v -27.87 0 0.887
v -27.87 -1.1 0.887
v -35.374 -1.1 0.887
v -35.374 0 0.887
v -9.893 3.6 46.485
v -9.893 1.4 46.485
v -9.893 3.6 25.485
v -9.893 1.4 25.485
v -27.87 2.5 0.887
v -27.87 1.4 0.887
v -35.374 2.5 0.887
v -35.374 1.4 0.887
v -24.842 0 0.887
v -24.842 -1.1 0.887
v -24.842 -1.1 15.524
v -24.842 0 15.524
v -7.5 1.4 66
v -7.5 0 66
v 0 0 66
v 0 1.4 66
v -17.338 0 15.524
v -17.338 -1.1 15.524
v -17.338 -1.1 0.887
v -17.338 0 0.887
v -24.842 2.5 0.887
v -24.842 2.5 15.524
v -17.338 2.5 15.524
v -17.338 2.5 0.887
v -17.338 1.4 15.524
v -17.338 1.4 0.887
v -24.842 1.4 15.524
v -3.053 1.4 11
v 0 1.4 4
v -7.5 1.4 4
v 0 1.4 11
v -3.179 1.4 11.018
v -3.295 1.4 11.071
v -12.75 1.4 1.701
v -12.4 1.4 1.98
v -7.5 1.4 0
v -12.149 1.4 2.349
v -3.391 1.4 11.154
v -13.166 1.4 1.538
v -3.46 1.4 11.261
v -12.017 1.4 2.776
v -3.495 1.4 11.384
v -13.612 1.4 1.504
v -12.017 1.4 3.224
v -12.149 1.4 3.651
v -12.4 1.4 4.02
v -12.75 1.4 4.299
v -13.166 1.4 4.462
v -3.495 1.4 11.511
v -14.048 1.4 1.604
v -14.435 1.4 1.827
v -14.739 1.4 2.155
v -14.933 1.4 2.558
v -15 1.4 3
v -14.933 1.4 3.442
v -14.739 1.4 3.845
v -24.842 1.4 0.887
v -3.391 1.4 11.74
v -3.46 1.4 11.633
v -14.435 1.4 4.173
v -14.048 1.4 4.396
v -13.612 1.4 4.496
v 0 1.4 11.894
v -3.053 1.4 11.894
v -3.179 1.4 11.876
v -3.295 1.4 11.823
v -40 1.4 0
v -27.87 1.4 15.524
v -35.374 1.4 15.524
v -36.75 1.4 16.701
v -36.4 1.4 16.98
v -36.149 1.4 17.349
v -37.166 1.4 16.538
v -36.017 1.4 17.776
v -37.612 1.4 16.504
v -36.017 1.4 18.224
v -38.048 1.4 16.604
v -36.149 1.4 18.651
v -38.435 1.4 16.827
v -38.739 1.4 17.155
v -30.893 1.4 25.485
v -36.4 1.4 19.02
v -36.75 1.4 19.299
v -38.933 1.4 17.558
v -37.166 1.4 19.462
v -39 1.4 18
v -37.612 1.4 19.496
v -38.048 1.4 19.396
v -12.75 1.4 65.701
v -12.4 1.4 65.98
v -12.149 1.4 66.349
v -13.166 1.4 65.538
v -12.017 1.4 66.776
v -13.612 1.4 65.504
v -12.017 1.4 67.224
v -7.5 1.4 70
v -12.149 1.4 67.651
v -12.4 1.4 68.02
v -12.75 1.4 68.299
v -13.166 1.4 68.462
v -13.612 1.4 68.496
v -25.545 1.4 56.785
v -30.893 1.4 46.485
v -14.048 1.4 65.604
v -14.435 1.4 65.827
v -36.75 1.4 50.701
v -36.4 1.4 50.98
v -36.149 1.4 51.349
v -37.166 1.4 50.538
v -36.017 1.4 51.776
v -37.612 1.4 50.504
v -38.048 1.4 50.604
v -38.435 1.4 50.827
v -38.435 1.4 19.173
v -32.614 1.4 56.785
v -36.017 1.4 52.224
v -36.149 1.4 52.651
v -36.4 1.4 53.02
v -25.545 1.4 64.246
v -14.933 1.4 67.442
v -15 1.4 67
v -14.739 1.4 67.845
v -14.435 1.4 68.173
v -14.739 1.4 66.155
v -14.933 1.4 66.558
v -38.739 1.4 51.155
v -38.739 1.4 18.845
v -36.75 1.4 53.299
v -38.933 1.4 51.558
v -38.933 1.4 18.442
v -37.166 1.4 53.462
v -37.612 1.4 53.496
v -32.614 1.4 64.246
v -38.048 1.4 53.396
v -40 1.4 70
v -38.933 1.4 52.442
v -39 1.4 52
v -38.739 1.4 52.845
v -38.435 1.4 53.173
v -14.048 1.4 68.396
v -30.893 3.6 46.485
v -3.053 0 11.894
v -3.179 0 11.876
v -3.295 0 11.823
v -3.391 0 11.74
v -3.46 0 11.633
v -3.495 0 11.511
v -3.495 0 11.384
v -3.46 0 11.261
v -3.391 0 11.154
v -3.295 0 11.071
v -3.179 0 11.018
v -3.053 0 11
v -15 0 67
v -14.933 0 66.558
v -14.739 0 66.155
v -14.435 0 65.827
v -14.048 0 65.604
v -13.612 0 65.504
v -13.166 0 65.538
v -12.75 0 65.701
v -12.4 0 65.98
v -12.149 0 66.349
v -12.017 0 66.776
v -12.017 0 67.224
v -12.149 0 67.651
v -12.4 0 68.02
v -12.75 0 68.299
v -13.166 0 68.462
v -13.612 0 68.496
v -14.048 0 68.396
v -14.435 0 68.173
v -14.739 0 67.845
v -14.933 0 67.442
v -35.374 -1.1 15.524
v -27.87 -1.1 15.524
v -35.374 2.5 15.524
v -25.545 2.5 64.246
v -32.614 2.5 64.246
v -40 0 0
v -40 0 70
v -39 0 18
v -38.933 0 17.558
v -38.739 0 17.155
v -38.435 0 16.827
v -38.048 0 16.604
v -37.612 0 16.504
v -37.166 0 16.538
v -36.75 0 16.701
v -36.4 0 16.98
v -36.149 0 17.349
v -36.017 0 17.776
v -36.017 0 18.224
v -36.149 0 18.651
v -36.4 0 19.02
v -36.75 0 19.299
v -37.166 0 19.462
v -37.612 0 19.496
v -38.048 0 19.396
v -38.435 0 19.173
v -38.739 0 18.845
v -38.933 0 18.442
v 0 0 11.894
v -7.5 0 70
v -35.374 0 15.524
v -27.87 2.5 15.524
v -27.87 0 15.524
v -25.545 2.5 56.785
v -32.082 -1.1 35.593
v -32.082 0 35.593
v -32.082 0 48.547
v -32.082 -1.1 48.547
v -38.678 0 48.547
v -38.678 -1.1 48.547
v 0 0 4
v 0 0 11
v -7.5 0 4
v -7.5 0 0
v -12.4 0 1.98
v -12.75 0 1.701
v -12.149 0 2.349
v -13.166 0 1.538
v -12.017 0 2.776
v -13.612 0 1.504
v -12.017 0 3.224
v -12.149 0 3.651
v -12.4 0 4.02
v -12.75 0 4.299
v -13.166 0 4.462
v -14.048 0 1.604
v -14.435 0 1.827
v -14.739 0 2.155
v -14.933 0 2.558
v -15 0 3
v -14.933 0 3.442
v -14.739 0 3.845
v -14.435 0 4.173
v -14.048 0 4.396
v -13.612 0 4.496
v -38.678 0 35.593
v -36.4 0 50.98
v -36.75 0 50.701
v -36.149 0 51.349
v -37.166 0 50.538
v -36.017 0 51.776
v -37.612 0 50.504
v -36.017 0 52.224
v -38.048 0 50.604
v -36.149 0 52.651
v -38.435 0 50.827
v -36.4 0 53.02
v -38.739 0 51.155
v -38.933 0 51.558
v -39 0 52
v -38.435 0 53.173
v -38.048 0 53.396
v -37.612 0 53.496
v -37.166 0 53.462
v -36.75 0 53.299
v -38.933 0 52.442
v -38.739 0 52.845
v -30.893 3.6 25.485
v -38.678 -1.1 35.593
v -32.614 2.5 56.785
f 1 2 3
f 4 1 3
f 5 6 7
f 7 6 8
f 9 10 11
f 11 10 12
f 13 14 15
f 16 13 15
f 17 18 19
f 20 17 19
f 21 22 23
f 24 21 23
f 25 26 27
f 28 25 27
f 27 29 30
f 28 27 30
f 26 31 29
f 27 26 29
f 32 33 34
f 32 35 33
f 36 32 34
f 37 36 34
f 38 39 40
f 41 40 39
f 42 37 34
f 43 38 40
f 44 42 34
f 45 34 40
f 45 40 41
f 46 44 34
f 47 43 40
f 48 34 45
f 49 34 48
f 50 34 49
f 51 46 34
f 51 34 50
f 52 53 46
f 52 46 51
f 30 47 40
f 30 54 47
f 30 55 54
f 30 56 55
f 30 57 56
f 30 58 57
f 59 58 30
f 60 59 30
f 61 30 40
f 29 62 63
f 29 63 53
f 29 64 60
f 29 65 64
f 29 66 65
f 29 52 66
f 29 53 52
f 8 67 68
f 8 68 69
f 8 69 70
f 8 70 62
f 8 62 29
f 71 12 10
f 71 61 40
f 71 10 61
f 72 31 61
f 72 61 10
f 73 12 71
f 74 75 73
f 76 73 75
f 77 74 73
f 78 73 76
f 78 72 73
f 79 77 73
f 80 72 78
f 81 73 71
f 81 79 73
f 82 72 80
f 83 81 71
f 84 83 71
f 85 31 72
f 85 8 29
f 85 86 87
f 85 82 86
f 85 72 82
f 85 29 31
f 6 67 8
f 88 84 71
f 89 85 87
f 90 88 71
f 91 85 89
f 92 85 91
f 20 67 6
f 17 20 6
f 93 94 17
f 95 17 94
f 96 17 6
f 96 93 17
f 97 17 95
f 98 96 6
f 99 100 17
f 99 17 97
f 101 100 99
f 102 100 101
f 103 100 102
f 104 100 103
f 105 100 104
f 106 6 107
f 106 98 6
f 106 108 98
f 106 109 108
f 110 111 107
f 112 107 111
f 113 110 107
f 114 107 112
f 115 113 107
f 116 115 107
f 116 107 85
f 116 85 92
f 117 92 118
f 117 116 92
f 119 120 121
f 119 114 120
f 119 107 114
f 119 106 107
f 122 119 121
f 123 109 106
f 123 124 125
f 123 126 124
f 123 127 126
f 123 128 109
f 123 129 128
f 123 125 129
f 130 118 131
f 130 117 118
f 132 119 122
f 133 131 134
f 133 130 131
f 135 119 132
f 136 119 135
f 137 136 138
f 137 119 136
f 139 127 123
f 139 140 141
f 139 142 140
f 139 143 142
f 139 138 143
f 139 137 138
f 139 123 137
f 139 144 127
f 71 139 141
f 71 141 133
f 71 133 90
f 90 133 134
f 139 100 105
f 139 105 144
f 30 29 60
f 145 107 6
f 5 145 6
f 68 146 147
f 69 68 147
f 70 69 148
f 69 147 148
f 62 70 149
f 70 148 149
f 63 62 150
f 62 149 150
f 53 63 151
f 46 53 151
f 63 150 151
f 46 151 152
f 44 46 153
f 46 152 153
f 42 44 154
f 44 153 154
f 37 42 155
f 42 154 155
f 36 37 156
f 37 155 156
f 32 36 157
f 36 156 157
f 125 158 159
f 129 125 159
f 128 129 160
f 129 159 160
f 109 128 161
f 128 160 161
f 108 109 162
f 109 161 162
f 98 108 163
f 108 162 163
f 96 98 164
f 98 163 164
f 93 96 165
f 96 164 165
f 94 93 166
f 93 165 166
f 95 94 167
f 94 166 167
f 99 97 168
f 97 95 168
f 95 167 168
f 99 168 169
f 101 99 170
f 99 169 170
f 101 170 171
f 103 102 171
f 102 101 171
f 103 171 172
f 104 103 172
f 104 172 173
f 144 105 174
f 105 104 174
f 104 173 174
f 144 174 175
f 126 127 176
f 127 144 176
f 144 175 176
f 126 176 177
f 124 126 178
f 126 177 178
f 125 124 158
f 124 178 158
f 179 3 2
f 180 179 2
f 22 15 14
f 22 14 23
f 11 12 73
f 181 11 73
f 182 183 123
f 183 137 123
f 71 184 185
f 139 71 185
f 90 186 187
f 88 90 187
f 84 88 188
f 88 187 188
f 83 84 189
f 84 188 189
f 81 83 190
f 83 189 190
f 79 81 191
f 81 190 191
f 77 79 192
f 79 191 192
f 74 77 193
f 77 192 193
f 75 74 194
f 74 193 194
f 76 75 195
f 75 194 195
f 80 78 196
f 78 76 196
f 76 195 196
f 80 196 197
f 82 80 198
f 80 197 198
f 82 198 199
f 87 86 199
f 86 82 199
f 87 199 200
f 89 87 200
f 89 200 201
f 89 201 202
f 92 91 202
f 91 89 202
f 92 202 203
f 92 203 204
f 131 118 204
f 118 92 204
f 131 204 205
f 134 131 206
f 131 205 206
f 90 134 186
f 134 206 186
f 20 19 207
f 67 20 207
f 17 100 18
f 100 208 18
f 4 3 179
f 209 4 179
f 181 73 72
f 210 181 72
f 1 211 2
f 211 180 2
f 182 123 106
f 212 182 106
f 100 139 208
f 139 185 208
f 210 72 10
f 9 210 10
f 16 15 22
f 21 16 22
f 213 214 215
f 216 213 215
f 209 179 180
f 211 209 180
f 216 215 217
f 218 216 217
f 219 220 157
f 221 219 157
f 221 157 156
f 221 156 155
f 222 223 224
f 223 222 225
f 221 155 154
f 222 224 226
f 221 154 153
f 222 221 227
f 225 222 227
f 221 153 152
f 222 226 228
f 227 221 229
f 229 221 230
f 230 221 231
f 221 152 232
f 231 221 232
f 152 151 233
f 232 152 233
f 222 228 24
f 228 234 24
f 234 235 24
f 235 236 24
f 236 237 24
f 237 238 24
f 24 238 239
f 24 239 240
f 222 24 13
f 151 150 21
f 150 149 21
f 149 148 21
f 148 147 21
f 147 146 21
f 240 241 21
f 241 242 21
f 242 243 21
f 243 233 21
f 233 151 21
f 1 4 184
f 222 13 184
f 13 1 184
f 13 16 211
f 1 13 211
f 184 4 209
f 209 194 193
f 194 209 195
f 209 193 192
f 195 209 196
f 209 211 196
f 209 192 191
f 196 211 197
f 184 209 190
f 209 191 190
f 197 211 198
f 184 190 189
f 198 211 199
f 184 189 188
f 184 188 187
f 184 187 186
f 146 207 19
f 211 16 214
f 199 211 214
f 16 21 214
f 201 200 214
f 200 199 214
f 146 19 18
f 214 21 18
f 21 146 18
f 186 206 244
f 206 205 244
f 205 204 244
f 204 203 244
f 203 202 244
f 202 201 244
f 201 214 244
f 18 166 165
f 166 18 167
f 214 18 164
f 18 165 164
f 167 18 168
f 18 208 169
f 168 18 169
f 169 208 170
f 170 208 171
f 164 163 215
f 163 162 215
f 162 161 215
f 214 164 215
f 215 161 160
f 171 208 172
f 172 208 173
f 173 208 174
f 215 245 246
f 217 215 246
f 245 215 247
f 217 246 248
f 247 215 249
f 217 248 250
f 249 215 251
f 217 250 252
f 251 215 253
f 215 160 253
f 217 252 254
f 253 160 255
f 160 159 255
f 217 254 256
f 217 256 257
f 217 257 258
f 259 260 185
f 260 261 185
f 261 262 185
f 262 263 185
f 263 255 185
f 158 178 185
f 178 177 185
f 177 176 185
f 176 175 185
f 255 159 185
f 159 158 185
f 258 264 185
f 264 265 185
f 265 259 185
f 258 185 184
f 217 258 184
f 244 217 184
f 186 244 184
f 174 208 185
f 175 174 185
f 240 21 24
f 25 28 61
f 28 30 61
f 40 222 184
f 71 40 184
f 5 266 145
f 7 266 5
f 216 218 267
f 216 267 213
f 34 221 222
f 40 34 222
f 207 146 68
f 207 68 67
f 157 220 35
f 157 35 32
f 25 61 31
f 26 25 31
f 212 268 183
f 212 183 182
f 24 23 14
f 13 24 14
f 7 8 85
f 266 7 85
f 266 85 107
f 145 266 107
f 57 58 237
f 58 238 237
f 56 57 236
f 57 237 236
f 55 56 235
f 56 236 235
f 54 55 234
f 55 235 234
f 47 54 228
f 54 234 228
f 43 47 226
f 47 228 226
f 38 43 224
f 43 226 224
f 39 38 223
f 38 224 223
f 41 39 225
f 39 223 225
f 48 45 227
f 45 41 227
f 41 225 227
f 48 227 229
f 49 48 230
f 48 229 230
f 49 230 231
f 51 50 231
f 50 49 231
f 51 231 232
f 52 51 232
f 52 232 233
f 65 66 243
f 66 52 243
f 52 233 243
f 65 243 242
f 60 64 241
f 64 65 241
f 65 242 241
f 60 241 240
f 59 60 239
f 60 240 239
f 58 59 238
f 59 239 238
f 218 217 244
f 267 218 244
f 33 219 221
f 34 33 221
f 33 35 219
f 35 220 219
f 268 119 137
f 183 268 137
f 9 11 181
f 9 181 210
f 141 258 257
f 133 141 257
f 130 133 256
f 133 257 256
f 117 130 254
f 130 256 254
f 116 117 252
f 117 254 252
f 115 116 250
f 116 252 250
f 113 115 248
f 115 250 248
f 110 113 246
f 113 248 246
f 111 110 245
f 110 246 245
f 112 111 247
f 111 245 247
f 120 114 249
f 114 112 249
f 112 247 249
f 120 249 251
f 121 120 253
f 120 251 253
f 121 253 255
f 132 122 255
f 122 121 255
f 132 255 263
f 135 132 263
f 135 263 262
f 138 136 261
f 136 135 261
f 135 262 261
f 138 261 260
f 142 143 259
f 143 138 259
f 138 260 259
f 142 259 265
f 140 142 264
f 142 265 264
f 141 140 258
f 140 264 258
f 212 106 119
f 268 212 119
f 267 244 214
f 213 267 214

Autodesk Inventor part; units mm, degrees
ref_plane "YZ Plane" through (0, 0, 0) normal (1, 0, 0) x (0, 1, 0)
ref_plane "XZ Plane" through (0, 0, 0) normal (0, 1, 0) x (-1, 0, 0)
ref_plane "XY Plane" through (0, 0, 0) normal (0, 0, 1) x (1, 0, 0)
sketch "Sketch1" plane through (0, 0, 0) normal (0, 1, 0) x (-1, 0, 0)
  line L0 (40, 70) -> (0, 70)
  line L1 (0, 70) -> (0, 0)
  line L2 (0, 0) -> (40, 0)
  line L3 (40, 0) -> (40, 70)
  line L4 (0, 4) -> (7.5, 4)
  line L5 (7.5, 4) -> (7.5, 0)
  line L6 (7.5, 0) -> (0, 0)
  line L7 (0, 0) -> (0, 4)
  line L8 (0, 70) -> (7.5, 70)
  line L9 (7.5, 70) -> (7.5, 66)
  line L10 (7.5, 66) -> (0, 66)
  line L11 (0, 66) -> (0, 70)
  line L12 (0, 11) -> (3.0528, 11)
  line L13 (3.5, 11.4472) -> (3.5, 11.8944)
  line L14 (3.0528, 11.8944) -> (0, 11.8944)
  line L15 (0, 11.8944) -> (0, 11)
  arc A0 (3.0528, 11) -> (3.0528, 11.8944) centre (3.0528, 11.4472) ccw
  circle A1 centre (13.5, 3) radius 1.5
  circle A2 centre (13.5, 67) radius 1.5
  circle A3 centre (37.5, 52) radius 1.5
  circle A4 centre (37.5, 18) radius 1.5
  dimension "d0" = 70
  dimension "d1" = 40
  dimension "d2" = 0
  dimension "d3" = 0
  dimension "d4" = 7.5
  dimension "d5" = 7.5
  dimension "d6" = 4
  dimension "d7" = 4
  dimension "d8" = 1
  dimension "d9" = 11
  dimension "d10" = 3.5
  dimension "d13" = 3
  dimension "d14" = 3
  dimension "d15" = 3
  dimension "d16" = 3
  dimension "d17" = 13.5
  dimension "d18" = 13.5
  dimension "d19" = 3
  dimension "d20" = 3
  dimension "d21" = 2.5
  dimension "d22" = 2.5
  dimension "d23" = 18
  dimension "d24" = 18
extrude "Extrusion1" add sketch "Sketch1" along normal blind 1.4 contours L3 L2 L5 L4 L1 L12 A0 L14 L10 L9 L0
sketch "Sketch2" plane through (0, 1.4, 0) normal (0, 1, 0) x (1, 0, 0)
  line L0 (-30.8932, -46.4853) -> (-9.8932, -46.4853)
  line L1 (-9.8932, -46.4853) -> (-9.8932, -25.4853)
  line L2 (-9.8932, -25.4853) -> (-30.8932, -25.4853)
  line L3 (-30.8932, -25.4853) -> (-30.8932, -46.4853)
  point P0 (0, 0)
  dimension "d25" = 21
  dimension "d26" = 21
extrude "Extrusion2" add sketch "Sketch2" along normal blind 2.2
sketch "Sketch3" plane through (0, 1.4, 0) normal (0, 1, 0) x (1, 0, 0)
  line L0 (-35.3745, -15.5245) -> (-27.8702, -15.5245)
  line L1 (-27.8702, -15.5245) -> (-27.8702, -0.887)
  line L2 (-27.8702, -0.887) -> (-35.3745, -0.887)
  line L3 (-35.3745, -0.887) -> (-35.3745, -15.5245)
  line L4 (-24.8422, -15.5245) -> (-17.338, -15.5245)
  line L5 (-17.338, -15.5245) -> (-17.338, -0.887)
  line L6 (-17.338, -0.887) -> (-24.8422, -0.887)
  line L7 (-24.8422, -0.887) -> (-24.8422, -15.5245)
  point P0 (0, 0)
extrude "Extrusion3" add sketch "Sketch3" along normal blind 1.1 and the other way blind 2.5
sketch "Sketch4" plane through (0, 1.4, 0) normal (0, 1, 0) x (1, 0, 0)
  line L0 (-32.614, -64.2463) -> (-25.5454, -64.2463)
  line L1 (-25.5454, -64.2463) -> (-25.5454, -56.7849)
  line L2 (-25.5454, -56.7849) -> (-32.614, -56.7849)
  line L3 (-32.614, -56.7849) -> (-32.614, -64.2463)
  point P0 (0, 0)
extrude "Extrusion4" add sketch "Sketch4" along normal blind 1.1
sketch "Sketch5" plane through (0, 0, 0) normal (0, -1, 0) x (1, 0, 0)
  line L0 (-38.6782, 35.593) -> (-32.0822, 35.593)
  line L1 (-32.0822, 35.593) -> (-32.0822, 48.5473)
  line L2 (-32.0822, 48.5473) -> (-38.6782, 48.5473)
  line L3 (-38.6782, 48.5473) -> (-38.6782, 35.593)
  point P0 (0, 0)
extrude "Extrusion5" add sketch "Sketch5" along normal blind 1.1
properties part number "μQ7-962_Module"
